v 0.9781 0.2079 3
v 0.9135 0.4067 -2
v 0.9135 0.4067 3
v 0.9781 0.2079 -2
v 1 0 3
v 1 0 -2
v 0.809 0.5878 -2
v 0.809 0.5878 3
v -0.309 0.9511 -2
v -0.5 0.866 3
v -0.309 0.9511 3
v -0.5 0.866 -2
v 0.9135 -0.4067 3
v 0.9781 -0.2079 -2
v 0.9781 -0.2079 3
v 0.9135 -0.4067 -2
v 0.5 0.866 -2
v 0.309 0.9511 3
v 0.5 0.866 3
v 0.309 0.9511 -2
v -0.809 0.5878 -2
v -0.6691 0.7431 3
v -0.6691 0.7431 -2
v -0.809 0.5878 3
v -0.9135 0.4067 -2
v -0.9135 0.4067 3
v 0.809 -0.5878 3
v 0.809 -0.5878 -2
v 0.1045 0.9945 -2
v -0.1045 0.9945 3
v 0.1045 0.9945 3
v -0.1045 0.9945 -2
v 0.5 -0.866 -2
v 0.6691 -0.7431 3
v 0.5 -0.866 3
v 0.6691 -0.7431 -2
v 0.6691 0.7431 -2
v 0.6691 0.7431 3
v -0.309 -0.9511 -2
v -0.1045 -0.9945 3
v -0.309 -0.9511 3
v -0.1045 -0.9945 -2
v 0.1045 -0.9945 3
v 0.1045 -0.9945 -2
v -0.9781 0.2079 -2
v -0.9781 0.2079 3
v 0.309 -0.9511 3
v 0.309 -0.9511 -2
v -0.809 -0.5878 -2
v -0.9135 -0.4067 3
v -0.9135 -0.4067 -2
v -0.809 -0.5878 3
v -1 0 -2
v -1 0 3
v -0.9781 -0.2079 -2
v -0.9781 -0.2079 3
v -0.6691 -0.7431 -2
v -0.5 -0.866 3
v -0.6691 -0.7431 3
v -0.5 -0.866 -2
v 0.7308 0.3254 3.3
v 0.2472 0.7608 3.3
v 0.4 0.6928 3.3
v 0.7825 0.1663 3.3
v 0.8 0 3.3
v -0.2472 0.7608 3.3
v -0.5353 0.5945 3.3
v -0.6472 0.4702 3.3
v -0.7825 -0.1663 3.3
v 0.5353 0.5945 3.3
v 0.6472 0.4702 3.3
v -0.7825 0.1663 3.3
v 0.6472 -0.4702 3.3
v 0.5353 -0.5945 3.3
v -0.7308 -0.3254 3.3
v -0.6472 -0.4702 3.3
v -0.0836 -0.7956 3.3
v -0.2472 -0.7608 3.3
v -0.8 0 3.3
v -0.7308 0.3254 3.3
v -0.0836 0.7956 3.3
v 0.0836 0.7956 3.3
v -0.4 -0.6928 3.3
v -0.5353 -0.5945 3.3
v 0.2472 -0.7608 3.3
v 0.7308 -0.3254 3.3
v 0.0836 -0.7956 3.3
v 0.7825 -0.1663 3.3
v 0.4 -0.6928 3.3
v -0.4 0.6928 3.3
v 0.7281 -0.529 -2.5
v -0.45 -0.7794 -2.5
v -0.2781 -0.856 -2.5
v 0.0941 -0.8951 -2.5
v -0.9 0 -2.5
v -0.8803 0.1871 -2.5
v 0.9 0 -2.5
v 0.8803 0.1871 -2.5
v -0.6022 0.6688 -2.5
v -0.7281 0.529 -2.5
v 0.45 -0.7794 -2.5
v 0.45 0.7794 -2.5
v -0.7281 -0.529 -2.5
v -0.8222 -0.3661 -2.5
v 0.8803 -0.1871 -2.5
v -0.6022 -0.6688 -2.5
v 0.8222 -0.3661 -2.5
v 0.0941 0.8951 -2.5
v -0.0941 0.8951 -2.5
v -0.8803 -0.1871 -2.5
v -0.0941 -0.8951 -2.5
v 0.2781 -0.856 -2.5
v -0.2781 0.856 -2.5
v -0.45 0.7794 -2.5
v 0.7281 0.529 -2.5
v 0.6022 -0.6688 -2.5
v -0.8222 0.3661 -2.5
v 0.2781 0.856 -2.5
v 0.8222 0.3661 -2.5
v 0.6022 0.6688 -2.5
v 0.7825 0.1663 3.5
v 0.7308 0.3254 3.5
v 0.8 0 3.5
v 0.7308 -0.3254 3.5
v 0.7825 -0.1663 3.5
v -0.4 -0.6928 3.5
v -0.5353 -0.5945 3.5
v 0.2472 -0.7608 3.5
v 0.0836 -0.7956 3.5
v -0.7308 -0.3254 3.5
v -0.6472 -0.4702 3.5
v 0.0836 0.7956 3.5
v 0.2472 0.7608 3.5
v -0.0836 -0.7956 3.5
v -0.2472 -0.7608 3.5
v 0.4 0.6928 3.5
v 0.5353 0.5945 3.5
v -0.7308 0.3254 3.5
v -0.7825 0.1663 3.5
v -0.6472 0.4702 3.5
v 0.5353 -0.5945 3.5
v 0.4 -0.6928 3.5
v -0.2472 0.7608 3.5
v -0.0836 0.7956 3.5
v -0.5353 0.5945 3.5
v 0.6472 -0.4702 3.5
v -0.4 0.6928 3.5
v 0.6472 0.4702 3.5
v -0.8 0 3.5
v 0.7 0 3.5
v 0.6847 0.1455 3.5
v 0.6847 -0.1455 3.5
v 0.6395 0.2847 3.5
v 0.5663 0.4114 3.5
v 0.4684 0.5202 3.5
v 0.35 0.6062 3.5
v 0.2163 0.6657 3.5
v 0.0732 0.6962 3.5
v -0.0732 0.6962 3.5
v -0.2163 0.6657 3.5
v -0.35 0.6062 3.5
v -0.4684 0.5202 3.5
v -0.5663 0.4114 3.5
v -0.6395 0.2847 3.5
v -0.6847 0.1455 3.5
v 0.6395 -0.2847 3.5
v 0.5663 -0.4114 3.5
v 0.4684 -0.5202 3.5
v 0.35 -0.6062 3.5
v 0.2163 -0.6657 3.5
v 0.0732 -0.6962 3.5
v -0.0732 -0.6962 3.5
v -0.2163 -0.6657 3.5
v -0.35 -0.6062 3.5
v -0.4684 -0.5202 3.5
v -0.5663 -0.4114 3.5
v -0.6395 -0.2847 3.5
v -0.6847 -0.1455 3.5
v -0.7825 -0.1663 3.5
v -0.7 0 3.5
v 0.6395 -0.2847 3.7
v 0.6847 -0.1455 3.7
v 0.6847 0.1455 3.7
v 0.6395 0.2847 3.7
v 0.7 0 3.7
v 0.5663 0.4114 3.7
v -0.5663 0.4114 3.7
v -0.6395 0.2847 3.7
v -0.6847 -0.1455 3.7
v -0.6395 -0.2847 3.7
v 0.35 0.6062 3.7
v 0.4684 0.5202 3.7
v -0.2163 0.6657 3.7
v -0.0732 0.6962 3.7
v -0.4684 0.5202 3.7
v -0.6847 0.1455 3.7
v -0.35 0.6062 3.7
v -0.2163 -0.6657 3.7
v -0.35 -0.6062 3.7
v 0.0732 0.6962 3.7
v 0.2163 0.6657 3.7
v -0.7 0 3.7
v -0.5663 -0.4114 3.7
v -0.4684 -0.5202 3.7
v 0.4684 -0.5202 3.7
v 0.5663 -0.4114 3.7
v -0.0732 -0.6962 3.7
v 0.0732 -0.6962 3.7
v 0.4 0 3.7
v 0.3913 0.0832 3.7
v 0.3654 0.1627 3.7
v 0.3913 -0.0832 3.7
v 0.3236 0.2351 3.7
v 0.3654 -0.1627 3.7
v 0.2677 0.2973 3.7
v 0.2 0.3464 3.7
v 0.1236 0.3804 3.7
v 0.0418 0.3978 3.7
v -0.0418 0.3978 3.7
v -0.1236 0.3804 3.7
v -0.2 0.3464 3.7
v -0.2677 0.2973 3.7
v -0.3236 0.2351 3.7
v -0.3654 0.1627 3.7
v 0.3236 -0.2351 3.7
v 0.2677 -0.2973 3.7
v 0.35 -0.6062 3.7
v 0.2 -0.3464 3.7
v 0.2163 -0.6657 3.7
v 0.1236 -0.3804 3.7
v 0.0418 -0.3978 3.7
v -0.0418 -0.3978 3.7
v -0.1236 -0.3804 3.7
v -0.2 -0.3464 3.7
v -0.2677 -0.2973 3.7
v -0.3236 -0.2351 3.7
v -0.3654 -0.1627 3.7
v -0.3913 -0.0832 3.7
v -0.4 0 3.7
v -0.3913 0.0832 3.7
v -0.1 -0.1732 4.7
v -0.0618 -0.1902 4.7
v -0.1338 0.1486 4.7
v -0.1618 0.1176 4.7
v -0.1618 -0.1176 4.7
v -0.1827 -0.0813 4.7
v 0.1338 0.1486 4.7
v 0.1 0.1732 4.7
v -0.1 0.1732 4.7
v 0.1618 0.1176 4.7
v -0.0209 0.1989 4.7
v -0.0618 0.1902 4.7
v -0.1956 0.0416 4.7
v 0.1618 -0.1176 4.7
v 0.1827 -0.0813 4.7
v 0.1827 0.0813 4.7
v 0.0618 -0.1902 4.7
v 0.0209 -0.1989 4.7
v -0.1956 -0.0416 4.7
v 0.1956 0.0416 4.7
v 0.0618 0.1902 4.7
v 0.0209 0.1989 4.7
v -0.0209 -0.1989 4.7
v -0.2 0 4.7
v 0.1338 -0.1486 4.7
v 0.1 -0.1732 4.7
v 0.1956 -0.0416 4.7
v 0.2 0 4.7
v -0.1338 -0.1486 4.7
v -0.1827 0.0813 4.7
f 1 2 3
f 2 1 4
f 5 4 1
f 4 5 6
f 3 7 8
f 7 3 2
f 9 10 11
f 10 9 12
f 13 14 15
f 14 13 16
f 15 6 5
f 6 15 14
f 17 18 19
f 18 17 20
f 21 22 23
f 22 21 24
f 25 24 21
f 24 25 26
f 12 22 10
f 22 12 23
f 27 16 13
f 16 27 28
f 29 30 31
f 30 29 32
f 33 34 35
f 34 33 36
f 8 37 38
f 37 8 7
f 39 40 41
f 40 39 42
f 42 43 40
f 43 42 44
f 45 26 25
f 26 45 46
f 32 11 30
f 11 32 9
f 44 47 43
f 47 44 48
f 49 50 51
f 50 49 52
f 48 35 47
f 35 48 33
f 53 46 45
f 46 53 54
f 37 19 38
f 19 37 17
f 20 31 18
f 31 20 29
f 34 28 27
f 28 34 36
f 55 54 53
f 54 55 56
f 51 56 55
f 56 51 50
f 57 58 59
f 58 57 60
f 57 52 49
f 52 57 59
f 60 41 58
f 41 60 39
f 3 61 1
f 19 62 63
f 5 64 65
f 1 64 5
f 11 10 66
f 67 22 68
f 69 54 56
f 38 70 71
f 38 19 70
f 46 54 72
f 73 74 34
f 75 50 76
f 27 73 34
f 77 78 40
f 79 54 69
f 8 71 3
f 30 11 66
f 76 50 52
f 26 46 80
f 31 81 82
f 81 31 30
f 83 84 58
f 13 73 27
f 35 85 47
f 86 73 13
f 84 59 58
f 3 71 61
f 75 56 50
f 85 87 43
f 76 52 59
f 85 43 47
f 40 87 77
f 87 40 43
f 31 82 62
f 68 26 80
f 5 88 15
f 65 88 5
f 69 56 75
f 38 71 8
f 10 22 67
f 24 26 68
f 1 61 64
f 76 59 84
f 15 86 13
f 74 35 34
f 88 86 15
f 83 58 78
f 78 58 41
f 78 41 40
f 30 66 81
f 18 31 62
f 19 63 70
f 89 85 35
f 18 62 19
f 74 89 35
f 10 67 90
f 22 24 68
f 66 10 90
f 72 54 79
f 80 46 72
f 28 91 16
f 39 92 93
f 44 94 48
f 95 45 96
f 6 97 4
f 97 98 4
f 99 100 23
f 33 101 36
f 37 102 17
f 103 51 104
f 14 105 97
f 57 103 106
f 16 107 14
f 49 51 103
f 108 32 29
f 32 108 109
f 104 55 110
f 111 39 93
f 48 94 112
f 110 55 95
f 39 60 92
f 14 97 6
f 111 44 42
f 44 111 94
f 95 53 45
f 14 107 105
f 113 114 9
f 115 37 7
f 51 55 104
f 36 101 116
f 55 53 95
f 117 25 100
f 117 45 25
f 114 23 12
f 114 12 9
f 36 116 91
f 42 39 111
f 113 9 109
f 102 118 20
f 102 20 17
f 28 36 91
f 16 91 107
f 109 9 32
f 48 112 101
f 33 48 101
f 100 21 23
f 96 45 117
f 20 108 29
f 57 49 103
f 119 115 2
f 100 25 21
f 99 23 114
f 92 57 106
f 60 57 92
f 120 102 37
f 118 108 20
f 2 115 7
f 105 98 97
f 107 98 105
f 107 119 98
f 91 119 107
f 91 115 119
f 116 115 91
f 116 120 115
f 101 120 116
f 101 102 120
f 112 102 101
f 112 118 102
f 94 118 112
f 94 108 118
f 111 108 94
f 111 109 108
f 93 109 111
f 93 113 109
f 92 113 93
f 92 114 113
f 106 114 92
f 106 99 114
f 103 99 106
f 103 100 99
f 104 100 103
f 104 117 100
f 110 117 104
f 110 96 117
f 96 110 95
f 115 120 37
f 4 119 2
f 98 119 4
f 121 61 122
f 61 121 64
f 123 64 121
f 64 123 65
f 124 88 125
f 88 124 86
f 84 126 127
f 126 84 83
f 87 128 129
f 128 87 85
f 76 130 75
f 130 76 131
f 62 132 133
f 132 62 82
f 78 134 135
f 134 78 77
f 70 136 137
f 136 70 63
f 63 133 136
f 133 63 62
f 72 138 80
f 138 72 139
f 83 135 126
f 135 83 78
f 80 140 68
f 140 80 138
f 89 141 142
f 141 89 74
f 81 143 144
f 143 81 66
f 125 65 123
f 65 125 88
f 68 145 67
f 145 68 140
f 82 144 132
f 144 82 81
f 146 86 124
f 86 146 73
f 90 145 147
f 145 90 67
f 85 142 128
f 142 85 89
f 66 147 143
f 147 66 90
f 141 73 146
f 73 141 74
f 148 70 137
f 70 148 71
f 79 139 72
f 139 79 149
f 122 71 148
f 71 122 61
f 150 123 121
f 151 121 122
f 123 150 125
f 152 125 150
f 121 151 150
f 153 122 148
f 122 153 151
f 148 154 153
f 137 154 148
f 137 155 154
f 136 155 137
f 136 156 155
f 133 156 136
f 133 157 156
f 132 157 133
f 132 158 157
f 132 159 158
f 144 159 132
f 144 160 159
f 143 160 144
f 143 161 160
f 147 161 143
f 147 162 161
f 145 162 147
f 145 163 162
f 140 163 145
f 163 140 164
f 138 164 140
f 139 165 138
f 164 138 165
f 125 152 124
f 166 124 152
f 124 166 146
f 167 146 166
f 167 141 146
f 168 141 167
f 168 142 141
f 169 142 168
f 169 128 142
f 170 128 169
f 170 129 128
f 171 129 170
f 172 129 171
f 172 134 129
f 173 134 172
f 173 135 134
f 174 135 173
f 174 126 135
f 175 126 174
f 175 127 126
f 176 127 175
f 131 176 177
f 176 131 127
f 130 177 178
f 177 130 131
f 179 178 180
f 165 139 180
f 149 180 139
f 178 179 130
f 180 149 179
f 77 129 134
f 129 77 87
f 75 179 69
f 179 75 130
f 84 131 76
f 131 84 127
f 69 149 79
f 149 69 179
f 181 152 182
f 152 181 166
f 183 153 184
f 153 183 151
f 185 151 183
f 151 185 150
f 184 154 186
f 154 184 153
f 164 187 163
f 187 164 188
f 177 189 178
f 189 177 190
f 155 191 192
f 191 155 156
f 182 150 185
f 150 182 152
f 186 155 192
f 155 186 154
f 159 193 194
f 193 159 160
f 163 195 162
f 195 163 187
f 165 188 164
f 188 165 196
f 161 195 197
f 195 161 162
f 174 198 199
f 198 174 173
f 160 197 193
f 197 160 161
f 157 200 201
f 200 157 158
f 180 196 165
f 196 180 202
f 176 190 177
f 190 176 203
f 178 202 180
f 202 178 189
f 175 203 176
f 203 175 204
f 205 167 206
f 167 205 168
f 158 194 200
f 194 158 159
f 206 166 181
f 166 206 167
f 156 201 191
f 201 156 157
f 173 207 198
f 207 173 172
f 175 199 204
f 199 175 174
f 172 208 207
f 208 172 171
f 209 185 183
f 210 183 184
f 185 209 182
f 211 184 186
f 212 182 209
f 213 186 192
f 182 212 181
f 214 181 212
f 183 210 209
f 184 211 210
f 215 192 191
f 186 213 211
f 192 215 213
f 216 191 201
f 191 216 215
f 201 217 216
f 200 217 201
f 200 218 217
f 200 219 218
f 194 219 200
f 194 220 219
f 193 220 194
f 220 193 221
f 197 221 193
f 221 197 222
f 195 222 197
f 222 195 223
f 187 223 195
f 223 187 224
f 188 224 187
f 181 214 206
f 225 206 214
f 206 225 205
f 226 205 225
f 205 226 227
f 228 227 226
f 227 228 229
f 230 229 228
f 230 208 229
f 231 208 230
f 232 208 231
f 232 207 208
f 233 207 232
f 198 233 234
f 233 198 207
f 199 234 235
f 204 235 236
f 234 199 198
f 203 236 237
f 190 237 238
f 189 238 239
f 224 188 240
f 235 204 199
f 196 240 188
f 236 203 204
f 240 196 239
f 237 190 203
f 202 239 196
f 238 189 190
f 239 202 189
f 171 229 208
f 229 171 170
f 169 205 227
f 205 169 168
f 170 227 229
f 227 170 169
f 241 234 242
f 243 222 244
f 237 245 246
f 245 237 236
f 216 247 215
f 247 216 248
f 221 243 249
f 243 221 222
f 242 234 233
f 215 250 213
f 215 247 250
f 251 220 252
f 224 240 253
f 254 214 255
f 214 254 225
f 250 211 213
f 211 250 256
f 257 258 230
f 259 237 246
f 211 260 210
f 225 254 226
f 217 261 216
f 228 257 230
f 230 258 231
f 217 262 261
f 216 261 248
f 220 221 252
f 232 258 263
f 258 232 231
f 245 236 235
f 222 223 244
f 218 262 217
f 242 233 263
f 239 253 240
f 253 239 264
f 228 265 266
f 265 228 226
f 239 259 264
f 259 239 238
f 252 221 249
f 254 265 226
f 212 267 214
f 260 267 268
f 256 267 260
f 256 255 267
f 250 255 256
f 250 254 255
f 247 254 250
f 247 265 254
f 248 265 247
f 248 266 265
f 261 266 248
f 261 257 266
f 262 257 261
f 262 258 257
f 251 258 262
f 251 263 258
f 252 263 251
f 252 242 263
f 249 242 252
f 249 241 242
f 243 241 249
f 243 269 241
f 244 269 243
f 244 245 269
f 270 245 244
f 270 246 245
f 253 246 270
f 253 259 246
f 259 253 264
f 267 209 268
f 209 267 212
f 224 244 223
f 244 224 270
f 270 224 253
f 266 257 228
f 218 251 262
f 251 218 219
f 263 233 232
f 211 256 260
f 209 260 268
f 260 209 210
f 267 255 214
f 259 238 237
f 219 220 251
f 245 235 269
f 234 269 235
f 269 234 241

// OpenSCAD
color("#e5c54f"){
// color("#ec0606"){
translate([0,0,0.5])
cylinder(5, 1,1, $fn = 30, center = true);
}


color("#e5c54f"){
//color("#ec0606"){
translate([0,0,3])
cylinder(0.3, 1,0.8, $fn = 30);
}

color("#e5c54f"){
//color("#ec0606"){
translate([0,0,-2.5])
cylinder(0.5,0.9,1, $fn = 30);
}


color("#f9f2f2"){
translate([0,0,3.3])
cylinder(0.2, 0.8,0.8, $fn = 30);
}


color("#f9f2f2"){
translate([0,0,3.5])
cylinder(0.2, 0.7,0.7, $fn = 30);
}


color("#f9f2f2"){
translate([0,0,3.7])
cylinder(1, 0.4,0.2, $fn = 30);
}
